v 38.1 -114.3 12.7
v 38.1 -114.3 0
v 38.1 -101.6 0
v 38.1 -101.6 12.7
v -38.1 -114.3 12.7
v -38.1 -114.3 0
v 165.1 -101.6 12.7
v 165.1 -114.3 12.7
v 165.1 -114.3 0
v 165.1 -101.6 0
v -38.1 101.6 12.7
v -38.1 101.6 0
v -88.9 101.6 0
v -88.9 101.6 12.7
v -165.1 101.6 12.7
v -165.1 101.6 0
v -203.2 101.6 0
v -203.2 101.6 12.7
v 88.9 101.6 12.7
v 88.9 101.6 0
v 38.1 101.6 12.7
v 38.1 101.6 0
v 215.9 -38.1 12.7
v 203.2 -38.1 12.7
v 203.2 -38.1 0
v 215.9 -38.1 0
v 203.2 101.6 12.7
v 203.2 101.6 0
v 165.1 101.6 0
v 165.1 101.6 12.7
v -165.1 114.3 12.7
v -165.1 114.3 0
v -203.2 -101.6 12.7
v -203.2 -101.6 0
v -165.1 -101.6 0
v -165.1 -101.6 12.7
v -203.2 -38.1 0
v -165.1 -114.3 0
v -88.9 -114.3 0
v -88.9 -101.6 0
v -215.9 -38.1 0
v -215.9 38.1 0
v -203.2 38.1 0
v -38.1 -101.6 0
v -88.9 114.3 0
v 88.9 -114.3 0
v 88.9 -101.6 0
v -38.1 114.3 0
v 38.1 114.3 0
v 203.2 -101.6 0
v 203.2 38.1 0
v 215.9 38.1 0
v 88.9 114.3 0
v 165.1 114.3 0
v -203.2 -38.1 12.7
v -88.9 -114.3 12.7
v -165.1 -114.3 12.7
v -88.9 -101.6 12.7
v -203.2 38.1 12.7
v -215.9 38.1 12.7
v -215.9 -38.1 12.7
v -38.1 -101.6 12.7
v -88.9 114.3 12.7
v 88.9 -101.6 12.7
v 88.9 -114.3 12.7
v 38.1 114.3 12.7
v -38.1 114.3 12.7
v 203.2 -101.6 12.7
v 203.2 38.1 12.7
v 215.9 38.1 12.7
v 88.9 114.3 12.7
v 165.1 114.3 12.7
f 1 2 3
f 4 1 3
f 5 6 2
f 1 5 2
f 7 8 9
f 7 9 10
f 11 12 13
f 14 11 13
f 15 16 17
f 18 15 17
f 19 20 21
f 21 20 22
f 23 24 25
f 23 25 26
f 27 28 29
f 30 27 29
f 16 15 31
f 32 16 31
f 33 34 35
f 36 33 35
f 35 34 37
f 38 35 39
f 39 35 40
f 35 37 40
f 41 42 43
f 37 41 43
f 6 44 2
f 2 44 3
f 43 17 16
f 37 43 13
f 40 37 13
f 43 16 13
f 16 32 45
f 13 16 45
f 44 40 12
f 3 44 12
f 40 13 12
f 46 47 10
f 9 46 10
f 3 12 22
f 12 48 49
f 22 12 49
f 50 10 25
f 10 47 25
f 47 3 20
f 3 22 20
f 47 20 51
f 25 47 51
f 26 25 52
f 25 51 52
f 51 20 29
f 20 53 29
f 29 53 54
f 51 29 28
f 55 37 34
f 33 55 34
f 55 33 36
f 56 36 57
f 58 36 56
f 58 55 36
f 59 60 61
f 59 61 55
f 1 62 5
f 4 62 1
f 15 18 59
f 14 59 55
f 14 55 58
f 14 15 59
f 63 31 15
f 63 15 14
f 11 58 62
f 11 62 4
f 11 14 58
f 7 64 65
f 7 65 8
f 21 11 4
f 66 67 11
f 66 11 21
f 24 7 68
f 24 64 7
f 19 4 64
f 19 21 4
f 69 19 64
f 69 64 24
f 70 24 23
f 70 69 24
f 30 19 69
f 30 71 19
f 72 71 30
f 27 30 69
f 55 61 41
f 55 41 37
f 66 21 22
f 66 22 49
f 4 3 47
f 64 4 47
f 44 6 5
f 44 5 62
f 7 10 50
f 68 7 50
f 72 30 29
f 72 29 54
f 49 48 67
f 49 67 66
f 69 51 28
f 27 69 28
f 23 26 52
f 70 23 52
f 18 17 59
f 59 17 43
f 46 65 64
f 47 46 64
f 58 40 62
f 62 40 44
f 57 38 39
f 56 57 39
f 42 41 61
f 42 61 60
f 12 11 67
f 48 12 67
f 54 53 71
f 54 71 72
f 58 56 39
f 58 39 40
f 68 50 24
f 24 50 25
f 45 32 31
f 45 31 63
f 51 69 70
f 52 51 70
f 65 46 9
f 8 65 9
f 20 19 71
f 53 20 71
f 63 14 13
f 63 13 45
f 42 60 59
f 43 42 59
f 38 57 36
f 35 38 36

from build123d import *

# Parameters (mm, degrees)
F0_W     = 12.7
F0_H     = 76.2
F0_W_2   = 76.2
F0_H_2   = 12.7
F1_DEPTH = 12.7


with BuildPart() as f1:
    # F0 (on Top) → F1 (new body)
    with BuildSketch(Plane.XY):
        Polygon((-165.1, 101.6), (-203.2, 101.6), (-203.2, 38.1), (-190.5, 38.1), (-190.5, -38.1), (-203.2, -38.1), (-203.2, -101.6), (-165.1, -101.6), (-165.1, -88.9), (-88.9, -88.9), (-88.9, -101.6), (-38.1, -101.6), (-38.1, -88.9), (38.1, -88.9), (38.1, -101.6), (88.9, -101.6), (88.9, -88.9), (165.1, -88.9), (165.1, -101.6), (203.2, -101.6), (203.2, -38.1), (190.5, -38.1), (190.5, 38.1), (203.2, 38.1), (203.2, 101.6), (165.1, 101.6), (165.1, 88.9), (88.9, 88.9), (88.9, 101.6), (38.1, 101.6), (38.1, 88.9), (-38.1, 88.9), (-38.1, 101.6), (-88.9, 101.6), (-88.9, 88.9), (-165.1, 88.9), align=None)
        with Locations((-196.85, 0)):
            Rectangle(F0_W, F0_H)
        with Locations((-209.55, 0)):
            Rectangle(F0_W, F0_H)
        with Locations((0, 107.95)):
            Rectangle(F0_W_2, F0_H_2)
        with Locations((0, 95.25)):
            Rectangle(F0_W_2, F0_H_2)
        with Locations((0, -107.95)):
            Rectangle(F0_W_2, F0_H_2)
        with Locations((0, -95.25)):
            Rectangle(F0_W_2, F0_H_2)
        with Locations((196.85, 0)):
            Rectangle(F0_W, F0_H)
        with Locations((209.55, 0)):
            Rectangle(F0_W, F0_H)
        with Locations((-127, 107.95)):
            Rectangle(F0_W_2, F0_H_2)
        with Locations((-127, 95.25)):
            Rectangle(F0_W_2, F0_H_2)
        with Locations((127, 95.25)):
            Rectangle(F0_W_2, F0_H_2)
        with Locations((127, 107.95)):
            Rectangle(F0_W_2, F0_H_2)
        with Locations((127, -95.25)):
            Rectangle(F0_W_2, F0_H_2)
        with Locations((127, -107.95)):
            Rectangle(F0_W_2, F0_H_2)
        with Locations((-127, -95.25)):
            Rectangle(F0_W_2, F0_H_2)
        with Locations((-127, -107.95)):
            Rectangle(F0_W_2, F0_H_2)
    extrude(amount=F1_DEPTH)


solid = f1.part
